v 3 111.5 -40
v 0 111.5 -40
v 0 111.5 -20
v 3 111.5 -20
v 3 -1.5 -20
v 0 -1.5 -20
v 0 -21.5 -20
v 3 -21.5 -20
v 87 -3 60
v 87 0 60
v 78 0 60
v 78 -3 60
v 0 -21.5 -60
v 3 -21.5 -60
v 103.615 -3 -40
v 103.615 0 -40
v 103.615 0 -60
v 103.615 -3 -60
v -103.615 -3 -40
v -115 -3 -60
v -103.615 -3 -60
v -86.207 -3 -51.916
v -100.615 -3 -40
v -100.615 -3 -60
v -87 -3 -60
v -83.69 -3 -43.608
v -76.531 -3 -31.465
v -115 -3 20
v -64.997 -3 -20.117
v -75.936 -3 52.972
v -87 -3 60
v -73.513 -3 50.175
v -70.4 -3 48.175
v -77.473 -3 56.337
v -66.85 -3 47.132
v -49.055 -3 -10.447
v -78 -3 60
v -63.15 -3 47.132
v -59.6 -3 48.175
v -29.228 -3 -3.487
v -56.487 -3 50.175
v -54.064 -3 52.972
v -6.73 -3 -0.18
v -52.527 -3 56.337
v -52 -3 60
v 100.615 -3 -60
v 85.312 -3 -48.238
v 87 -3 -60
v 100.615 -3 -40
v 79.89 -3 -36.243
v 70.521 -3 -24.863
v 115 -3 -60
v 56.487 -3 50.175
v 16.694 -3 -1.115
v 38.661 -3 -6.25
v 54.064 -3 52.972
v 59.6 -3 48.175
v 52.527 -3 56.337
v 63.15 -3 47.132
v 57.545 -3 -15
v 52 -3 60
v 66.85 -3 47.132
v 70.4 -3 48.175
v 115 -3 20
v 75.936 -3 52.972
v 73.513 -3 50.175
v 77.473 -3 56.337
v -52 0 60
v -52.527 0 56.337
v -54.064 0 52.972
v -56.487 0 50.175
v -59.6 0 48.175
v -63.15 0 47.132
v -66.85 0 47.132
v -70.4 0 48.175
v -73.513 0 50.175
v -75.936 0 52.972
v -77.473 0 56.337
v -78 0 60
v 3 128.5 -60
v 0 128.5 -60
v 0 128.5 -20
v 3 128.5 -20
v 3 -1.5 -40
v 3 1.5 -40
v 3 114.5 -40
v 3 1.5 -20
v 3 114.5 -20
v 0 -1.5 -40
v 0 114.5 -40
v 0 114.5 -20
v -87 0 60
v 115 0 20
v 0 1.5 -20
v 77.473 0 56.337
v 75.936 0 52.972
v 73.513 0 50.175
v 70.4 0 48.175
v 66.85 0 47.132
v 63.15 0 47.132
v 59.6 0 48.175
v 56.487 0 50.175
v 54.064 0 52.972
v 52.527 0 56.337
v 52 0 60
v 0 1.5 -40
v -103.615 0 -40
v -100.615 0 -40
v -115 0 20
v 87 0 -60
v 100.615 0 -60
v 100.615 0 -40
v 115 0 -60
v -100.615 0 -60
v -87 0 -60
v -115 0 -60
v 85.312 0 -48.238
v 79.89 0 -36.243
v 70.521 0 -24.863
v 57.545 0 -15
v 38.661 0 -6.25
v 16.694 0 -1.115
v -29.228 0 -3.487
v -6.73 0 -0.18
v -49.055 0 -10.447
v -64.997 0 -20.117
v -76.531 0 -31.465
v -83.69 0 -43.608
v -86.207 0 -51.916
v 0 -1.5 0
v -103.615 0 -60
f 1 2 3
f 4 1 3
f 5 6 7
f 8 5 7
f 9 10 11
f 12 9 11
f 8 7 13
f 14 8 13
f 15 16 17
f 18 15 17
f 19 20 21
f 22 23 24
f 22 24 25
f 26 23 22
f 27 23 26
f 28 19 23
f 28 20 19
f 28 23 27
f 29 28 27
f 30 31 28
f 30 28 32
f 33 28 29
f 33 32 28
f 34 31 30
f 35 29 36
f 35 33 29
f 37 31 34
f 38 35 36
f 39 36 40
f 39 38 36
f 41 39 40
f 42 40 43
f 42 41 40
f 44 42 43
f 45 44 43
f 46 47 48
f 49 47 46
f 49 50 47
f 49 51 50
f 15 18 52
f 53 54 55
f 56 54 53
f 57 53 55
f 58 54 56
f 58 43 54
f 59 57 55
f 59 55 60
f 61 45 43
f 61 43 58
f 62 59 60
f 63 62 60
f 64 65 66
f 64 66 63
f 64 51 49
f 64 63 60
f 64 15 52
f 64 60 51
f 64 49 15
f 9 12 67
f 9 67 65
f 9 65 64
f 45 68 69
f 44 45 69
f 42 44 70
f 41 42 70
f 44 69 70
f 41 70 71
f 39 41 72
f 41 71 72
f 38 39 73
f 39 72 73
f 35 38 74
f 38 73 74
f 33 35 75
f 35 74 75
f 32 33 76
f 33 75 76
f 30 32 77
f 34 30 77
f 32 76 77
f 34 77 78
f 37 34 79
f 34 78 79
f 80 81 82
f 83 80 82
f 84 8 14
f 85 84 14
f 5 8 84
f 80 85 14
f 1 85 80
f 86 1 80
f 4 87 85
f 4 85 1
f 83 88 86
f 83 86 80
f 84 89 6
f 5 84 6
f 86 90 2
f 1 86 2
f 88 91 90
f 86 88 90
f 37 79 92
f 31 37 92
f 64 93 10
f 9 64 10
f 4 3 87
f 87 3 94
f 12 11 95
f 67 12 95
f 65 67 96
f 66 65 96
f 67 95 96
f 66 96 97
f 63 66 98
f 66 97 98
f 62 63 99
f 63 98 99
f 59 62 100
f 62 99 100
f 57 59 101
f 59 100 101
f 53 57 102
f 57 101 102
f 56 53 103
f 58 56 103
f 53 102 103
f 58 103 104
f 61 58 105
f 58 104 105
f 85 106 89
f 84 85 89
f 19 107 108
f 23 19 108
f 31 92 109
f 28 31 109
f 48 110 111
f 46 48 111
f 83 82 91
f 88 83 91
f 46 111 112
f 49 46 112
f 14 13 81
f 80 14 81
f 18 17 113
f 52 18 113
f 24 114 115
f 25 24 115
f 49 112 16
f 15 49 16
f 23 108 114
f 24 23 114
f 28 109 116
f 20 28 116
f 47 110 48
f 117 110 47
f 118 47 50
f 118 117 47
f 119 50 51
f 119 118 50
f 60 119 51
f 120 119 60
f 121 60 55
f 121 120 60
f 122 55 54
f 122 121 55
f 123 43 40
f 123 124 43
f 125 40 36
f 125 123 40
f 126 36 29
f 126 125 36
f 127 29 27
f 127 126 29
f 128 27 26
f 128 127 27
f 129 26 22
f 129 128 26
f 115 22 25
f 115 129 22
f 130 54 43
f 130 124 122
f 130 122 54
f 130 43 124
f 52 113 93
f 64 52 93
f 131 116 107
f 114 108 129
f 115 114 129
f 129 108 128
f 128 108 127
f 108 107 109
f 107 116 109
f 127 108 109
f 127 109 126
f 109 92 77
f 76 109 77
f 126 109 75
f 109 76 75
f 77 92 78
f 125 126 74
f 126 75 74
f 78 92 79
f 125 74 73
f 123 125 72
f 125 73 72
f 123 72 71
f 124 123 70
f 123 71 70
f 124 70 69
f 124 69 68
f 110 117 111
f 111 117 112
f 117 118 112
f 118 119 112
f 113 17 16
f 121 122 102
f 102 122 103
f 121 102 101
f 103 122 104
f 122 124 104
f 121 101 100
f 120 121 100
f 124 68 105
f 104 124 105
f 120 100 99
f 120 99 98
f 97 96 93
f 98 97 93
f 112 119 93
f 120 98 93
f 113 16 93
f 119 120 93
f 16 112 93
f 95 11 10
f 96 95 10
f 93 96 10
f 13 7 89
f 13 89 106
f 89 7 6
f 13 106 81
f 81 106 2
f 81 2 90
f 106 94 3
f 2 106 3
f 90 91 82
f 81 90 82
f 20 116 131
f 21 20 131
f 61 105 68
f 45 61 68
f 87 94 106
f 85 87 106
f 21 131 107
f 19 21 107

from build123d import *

# Parameters (mm, degrees)
F1_DEPTH = 3
F3_DEPTH = 3


with BuildPart() as f1:
    # F0 (on Front) → F1 (new body)
    with BuildSketch(Plane.XZ):
        with BuildLine():
            Line((87, 60), (78, 60))
            ThreePointArc((78, 60), (65, 47), (52, 60))
            Line((52, 60), (-52, 60))
            ThreePointArc((-52, 60), (-65, 47), (-78, 60))
            Line((-78, 60), (-87, 60))
            Line((-87, 60), (-115, 20))
            Line((-115, 20), (-115, -60))
            Line((-115, -60), (-103.615403, -60))
            Line((-103.615403, -60), (-103.615403, -40))
            Line((-103.615403, -40), (-100.615403, -40))
            Line((-100.615403, -40), (-100.615403, -60))
            Line((-100.615403, -60), (-87, -60))
            add(Edge.make_bspline(
                [(87, -60), (87, 0), (0, 0), (-87, 0), (-87, -60)],
                knots=[0, 0, 0, 1.570796, 1.570796, 3.141593, 3.141593, 3.141593], degree=2, weights=[1, 0.707107, 1, 0.707107, 1]))
            Line((87, -60), (100.615403, -60))
            Line((100.615403, -60), (100.615403, -40))
            Line((100.615403, -40), (103.615403, -40))
            Line((103.615403, -40), (103.615403, -60))
            Line((103.615403, -60), (115, -60))
            Line((115, -60), (115, 20))
            Line((115, 20), (87, 60))
        make_face()
    extrude(amount=F1_DEPTH)


with BuildPart() as f3:
    # F2 (on Right) → F3 (new body)
    with BuildSketch(Plane.YZ):
        Polygon((1.5, -40), (1.5, -60), (111.5, -60), (111.5, -40), (111.5, -20), (1.5, -20), align=None)
        Polygon((-21.5, -20), (-21.5, -60), (-1.5, -60), (-1.5, -40), (-1.5, -20), align=None)
        Polygon((-1.5, -40), (-1.5, -60), (1.5, -60), (1.5, -40), (0, -40), align=None)
        Polygon((111.5, -40), (111.5, -60), (114.5, -60), (114.5, -40), (113, -40), align=None)
        Polygon((114.5, -40), (114.5, -60), (128.5, -60), (128.5, -20), (114.5, -20), align=None)
    extrude(amount=F3_DEPTH)


solid = Compound([f1.part, f3.part])
